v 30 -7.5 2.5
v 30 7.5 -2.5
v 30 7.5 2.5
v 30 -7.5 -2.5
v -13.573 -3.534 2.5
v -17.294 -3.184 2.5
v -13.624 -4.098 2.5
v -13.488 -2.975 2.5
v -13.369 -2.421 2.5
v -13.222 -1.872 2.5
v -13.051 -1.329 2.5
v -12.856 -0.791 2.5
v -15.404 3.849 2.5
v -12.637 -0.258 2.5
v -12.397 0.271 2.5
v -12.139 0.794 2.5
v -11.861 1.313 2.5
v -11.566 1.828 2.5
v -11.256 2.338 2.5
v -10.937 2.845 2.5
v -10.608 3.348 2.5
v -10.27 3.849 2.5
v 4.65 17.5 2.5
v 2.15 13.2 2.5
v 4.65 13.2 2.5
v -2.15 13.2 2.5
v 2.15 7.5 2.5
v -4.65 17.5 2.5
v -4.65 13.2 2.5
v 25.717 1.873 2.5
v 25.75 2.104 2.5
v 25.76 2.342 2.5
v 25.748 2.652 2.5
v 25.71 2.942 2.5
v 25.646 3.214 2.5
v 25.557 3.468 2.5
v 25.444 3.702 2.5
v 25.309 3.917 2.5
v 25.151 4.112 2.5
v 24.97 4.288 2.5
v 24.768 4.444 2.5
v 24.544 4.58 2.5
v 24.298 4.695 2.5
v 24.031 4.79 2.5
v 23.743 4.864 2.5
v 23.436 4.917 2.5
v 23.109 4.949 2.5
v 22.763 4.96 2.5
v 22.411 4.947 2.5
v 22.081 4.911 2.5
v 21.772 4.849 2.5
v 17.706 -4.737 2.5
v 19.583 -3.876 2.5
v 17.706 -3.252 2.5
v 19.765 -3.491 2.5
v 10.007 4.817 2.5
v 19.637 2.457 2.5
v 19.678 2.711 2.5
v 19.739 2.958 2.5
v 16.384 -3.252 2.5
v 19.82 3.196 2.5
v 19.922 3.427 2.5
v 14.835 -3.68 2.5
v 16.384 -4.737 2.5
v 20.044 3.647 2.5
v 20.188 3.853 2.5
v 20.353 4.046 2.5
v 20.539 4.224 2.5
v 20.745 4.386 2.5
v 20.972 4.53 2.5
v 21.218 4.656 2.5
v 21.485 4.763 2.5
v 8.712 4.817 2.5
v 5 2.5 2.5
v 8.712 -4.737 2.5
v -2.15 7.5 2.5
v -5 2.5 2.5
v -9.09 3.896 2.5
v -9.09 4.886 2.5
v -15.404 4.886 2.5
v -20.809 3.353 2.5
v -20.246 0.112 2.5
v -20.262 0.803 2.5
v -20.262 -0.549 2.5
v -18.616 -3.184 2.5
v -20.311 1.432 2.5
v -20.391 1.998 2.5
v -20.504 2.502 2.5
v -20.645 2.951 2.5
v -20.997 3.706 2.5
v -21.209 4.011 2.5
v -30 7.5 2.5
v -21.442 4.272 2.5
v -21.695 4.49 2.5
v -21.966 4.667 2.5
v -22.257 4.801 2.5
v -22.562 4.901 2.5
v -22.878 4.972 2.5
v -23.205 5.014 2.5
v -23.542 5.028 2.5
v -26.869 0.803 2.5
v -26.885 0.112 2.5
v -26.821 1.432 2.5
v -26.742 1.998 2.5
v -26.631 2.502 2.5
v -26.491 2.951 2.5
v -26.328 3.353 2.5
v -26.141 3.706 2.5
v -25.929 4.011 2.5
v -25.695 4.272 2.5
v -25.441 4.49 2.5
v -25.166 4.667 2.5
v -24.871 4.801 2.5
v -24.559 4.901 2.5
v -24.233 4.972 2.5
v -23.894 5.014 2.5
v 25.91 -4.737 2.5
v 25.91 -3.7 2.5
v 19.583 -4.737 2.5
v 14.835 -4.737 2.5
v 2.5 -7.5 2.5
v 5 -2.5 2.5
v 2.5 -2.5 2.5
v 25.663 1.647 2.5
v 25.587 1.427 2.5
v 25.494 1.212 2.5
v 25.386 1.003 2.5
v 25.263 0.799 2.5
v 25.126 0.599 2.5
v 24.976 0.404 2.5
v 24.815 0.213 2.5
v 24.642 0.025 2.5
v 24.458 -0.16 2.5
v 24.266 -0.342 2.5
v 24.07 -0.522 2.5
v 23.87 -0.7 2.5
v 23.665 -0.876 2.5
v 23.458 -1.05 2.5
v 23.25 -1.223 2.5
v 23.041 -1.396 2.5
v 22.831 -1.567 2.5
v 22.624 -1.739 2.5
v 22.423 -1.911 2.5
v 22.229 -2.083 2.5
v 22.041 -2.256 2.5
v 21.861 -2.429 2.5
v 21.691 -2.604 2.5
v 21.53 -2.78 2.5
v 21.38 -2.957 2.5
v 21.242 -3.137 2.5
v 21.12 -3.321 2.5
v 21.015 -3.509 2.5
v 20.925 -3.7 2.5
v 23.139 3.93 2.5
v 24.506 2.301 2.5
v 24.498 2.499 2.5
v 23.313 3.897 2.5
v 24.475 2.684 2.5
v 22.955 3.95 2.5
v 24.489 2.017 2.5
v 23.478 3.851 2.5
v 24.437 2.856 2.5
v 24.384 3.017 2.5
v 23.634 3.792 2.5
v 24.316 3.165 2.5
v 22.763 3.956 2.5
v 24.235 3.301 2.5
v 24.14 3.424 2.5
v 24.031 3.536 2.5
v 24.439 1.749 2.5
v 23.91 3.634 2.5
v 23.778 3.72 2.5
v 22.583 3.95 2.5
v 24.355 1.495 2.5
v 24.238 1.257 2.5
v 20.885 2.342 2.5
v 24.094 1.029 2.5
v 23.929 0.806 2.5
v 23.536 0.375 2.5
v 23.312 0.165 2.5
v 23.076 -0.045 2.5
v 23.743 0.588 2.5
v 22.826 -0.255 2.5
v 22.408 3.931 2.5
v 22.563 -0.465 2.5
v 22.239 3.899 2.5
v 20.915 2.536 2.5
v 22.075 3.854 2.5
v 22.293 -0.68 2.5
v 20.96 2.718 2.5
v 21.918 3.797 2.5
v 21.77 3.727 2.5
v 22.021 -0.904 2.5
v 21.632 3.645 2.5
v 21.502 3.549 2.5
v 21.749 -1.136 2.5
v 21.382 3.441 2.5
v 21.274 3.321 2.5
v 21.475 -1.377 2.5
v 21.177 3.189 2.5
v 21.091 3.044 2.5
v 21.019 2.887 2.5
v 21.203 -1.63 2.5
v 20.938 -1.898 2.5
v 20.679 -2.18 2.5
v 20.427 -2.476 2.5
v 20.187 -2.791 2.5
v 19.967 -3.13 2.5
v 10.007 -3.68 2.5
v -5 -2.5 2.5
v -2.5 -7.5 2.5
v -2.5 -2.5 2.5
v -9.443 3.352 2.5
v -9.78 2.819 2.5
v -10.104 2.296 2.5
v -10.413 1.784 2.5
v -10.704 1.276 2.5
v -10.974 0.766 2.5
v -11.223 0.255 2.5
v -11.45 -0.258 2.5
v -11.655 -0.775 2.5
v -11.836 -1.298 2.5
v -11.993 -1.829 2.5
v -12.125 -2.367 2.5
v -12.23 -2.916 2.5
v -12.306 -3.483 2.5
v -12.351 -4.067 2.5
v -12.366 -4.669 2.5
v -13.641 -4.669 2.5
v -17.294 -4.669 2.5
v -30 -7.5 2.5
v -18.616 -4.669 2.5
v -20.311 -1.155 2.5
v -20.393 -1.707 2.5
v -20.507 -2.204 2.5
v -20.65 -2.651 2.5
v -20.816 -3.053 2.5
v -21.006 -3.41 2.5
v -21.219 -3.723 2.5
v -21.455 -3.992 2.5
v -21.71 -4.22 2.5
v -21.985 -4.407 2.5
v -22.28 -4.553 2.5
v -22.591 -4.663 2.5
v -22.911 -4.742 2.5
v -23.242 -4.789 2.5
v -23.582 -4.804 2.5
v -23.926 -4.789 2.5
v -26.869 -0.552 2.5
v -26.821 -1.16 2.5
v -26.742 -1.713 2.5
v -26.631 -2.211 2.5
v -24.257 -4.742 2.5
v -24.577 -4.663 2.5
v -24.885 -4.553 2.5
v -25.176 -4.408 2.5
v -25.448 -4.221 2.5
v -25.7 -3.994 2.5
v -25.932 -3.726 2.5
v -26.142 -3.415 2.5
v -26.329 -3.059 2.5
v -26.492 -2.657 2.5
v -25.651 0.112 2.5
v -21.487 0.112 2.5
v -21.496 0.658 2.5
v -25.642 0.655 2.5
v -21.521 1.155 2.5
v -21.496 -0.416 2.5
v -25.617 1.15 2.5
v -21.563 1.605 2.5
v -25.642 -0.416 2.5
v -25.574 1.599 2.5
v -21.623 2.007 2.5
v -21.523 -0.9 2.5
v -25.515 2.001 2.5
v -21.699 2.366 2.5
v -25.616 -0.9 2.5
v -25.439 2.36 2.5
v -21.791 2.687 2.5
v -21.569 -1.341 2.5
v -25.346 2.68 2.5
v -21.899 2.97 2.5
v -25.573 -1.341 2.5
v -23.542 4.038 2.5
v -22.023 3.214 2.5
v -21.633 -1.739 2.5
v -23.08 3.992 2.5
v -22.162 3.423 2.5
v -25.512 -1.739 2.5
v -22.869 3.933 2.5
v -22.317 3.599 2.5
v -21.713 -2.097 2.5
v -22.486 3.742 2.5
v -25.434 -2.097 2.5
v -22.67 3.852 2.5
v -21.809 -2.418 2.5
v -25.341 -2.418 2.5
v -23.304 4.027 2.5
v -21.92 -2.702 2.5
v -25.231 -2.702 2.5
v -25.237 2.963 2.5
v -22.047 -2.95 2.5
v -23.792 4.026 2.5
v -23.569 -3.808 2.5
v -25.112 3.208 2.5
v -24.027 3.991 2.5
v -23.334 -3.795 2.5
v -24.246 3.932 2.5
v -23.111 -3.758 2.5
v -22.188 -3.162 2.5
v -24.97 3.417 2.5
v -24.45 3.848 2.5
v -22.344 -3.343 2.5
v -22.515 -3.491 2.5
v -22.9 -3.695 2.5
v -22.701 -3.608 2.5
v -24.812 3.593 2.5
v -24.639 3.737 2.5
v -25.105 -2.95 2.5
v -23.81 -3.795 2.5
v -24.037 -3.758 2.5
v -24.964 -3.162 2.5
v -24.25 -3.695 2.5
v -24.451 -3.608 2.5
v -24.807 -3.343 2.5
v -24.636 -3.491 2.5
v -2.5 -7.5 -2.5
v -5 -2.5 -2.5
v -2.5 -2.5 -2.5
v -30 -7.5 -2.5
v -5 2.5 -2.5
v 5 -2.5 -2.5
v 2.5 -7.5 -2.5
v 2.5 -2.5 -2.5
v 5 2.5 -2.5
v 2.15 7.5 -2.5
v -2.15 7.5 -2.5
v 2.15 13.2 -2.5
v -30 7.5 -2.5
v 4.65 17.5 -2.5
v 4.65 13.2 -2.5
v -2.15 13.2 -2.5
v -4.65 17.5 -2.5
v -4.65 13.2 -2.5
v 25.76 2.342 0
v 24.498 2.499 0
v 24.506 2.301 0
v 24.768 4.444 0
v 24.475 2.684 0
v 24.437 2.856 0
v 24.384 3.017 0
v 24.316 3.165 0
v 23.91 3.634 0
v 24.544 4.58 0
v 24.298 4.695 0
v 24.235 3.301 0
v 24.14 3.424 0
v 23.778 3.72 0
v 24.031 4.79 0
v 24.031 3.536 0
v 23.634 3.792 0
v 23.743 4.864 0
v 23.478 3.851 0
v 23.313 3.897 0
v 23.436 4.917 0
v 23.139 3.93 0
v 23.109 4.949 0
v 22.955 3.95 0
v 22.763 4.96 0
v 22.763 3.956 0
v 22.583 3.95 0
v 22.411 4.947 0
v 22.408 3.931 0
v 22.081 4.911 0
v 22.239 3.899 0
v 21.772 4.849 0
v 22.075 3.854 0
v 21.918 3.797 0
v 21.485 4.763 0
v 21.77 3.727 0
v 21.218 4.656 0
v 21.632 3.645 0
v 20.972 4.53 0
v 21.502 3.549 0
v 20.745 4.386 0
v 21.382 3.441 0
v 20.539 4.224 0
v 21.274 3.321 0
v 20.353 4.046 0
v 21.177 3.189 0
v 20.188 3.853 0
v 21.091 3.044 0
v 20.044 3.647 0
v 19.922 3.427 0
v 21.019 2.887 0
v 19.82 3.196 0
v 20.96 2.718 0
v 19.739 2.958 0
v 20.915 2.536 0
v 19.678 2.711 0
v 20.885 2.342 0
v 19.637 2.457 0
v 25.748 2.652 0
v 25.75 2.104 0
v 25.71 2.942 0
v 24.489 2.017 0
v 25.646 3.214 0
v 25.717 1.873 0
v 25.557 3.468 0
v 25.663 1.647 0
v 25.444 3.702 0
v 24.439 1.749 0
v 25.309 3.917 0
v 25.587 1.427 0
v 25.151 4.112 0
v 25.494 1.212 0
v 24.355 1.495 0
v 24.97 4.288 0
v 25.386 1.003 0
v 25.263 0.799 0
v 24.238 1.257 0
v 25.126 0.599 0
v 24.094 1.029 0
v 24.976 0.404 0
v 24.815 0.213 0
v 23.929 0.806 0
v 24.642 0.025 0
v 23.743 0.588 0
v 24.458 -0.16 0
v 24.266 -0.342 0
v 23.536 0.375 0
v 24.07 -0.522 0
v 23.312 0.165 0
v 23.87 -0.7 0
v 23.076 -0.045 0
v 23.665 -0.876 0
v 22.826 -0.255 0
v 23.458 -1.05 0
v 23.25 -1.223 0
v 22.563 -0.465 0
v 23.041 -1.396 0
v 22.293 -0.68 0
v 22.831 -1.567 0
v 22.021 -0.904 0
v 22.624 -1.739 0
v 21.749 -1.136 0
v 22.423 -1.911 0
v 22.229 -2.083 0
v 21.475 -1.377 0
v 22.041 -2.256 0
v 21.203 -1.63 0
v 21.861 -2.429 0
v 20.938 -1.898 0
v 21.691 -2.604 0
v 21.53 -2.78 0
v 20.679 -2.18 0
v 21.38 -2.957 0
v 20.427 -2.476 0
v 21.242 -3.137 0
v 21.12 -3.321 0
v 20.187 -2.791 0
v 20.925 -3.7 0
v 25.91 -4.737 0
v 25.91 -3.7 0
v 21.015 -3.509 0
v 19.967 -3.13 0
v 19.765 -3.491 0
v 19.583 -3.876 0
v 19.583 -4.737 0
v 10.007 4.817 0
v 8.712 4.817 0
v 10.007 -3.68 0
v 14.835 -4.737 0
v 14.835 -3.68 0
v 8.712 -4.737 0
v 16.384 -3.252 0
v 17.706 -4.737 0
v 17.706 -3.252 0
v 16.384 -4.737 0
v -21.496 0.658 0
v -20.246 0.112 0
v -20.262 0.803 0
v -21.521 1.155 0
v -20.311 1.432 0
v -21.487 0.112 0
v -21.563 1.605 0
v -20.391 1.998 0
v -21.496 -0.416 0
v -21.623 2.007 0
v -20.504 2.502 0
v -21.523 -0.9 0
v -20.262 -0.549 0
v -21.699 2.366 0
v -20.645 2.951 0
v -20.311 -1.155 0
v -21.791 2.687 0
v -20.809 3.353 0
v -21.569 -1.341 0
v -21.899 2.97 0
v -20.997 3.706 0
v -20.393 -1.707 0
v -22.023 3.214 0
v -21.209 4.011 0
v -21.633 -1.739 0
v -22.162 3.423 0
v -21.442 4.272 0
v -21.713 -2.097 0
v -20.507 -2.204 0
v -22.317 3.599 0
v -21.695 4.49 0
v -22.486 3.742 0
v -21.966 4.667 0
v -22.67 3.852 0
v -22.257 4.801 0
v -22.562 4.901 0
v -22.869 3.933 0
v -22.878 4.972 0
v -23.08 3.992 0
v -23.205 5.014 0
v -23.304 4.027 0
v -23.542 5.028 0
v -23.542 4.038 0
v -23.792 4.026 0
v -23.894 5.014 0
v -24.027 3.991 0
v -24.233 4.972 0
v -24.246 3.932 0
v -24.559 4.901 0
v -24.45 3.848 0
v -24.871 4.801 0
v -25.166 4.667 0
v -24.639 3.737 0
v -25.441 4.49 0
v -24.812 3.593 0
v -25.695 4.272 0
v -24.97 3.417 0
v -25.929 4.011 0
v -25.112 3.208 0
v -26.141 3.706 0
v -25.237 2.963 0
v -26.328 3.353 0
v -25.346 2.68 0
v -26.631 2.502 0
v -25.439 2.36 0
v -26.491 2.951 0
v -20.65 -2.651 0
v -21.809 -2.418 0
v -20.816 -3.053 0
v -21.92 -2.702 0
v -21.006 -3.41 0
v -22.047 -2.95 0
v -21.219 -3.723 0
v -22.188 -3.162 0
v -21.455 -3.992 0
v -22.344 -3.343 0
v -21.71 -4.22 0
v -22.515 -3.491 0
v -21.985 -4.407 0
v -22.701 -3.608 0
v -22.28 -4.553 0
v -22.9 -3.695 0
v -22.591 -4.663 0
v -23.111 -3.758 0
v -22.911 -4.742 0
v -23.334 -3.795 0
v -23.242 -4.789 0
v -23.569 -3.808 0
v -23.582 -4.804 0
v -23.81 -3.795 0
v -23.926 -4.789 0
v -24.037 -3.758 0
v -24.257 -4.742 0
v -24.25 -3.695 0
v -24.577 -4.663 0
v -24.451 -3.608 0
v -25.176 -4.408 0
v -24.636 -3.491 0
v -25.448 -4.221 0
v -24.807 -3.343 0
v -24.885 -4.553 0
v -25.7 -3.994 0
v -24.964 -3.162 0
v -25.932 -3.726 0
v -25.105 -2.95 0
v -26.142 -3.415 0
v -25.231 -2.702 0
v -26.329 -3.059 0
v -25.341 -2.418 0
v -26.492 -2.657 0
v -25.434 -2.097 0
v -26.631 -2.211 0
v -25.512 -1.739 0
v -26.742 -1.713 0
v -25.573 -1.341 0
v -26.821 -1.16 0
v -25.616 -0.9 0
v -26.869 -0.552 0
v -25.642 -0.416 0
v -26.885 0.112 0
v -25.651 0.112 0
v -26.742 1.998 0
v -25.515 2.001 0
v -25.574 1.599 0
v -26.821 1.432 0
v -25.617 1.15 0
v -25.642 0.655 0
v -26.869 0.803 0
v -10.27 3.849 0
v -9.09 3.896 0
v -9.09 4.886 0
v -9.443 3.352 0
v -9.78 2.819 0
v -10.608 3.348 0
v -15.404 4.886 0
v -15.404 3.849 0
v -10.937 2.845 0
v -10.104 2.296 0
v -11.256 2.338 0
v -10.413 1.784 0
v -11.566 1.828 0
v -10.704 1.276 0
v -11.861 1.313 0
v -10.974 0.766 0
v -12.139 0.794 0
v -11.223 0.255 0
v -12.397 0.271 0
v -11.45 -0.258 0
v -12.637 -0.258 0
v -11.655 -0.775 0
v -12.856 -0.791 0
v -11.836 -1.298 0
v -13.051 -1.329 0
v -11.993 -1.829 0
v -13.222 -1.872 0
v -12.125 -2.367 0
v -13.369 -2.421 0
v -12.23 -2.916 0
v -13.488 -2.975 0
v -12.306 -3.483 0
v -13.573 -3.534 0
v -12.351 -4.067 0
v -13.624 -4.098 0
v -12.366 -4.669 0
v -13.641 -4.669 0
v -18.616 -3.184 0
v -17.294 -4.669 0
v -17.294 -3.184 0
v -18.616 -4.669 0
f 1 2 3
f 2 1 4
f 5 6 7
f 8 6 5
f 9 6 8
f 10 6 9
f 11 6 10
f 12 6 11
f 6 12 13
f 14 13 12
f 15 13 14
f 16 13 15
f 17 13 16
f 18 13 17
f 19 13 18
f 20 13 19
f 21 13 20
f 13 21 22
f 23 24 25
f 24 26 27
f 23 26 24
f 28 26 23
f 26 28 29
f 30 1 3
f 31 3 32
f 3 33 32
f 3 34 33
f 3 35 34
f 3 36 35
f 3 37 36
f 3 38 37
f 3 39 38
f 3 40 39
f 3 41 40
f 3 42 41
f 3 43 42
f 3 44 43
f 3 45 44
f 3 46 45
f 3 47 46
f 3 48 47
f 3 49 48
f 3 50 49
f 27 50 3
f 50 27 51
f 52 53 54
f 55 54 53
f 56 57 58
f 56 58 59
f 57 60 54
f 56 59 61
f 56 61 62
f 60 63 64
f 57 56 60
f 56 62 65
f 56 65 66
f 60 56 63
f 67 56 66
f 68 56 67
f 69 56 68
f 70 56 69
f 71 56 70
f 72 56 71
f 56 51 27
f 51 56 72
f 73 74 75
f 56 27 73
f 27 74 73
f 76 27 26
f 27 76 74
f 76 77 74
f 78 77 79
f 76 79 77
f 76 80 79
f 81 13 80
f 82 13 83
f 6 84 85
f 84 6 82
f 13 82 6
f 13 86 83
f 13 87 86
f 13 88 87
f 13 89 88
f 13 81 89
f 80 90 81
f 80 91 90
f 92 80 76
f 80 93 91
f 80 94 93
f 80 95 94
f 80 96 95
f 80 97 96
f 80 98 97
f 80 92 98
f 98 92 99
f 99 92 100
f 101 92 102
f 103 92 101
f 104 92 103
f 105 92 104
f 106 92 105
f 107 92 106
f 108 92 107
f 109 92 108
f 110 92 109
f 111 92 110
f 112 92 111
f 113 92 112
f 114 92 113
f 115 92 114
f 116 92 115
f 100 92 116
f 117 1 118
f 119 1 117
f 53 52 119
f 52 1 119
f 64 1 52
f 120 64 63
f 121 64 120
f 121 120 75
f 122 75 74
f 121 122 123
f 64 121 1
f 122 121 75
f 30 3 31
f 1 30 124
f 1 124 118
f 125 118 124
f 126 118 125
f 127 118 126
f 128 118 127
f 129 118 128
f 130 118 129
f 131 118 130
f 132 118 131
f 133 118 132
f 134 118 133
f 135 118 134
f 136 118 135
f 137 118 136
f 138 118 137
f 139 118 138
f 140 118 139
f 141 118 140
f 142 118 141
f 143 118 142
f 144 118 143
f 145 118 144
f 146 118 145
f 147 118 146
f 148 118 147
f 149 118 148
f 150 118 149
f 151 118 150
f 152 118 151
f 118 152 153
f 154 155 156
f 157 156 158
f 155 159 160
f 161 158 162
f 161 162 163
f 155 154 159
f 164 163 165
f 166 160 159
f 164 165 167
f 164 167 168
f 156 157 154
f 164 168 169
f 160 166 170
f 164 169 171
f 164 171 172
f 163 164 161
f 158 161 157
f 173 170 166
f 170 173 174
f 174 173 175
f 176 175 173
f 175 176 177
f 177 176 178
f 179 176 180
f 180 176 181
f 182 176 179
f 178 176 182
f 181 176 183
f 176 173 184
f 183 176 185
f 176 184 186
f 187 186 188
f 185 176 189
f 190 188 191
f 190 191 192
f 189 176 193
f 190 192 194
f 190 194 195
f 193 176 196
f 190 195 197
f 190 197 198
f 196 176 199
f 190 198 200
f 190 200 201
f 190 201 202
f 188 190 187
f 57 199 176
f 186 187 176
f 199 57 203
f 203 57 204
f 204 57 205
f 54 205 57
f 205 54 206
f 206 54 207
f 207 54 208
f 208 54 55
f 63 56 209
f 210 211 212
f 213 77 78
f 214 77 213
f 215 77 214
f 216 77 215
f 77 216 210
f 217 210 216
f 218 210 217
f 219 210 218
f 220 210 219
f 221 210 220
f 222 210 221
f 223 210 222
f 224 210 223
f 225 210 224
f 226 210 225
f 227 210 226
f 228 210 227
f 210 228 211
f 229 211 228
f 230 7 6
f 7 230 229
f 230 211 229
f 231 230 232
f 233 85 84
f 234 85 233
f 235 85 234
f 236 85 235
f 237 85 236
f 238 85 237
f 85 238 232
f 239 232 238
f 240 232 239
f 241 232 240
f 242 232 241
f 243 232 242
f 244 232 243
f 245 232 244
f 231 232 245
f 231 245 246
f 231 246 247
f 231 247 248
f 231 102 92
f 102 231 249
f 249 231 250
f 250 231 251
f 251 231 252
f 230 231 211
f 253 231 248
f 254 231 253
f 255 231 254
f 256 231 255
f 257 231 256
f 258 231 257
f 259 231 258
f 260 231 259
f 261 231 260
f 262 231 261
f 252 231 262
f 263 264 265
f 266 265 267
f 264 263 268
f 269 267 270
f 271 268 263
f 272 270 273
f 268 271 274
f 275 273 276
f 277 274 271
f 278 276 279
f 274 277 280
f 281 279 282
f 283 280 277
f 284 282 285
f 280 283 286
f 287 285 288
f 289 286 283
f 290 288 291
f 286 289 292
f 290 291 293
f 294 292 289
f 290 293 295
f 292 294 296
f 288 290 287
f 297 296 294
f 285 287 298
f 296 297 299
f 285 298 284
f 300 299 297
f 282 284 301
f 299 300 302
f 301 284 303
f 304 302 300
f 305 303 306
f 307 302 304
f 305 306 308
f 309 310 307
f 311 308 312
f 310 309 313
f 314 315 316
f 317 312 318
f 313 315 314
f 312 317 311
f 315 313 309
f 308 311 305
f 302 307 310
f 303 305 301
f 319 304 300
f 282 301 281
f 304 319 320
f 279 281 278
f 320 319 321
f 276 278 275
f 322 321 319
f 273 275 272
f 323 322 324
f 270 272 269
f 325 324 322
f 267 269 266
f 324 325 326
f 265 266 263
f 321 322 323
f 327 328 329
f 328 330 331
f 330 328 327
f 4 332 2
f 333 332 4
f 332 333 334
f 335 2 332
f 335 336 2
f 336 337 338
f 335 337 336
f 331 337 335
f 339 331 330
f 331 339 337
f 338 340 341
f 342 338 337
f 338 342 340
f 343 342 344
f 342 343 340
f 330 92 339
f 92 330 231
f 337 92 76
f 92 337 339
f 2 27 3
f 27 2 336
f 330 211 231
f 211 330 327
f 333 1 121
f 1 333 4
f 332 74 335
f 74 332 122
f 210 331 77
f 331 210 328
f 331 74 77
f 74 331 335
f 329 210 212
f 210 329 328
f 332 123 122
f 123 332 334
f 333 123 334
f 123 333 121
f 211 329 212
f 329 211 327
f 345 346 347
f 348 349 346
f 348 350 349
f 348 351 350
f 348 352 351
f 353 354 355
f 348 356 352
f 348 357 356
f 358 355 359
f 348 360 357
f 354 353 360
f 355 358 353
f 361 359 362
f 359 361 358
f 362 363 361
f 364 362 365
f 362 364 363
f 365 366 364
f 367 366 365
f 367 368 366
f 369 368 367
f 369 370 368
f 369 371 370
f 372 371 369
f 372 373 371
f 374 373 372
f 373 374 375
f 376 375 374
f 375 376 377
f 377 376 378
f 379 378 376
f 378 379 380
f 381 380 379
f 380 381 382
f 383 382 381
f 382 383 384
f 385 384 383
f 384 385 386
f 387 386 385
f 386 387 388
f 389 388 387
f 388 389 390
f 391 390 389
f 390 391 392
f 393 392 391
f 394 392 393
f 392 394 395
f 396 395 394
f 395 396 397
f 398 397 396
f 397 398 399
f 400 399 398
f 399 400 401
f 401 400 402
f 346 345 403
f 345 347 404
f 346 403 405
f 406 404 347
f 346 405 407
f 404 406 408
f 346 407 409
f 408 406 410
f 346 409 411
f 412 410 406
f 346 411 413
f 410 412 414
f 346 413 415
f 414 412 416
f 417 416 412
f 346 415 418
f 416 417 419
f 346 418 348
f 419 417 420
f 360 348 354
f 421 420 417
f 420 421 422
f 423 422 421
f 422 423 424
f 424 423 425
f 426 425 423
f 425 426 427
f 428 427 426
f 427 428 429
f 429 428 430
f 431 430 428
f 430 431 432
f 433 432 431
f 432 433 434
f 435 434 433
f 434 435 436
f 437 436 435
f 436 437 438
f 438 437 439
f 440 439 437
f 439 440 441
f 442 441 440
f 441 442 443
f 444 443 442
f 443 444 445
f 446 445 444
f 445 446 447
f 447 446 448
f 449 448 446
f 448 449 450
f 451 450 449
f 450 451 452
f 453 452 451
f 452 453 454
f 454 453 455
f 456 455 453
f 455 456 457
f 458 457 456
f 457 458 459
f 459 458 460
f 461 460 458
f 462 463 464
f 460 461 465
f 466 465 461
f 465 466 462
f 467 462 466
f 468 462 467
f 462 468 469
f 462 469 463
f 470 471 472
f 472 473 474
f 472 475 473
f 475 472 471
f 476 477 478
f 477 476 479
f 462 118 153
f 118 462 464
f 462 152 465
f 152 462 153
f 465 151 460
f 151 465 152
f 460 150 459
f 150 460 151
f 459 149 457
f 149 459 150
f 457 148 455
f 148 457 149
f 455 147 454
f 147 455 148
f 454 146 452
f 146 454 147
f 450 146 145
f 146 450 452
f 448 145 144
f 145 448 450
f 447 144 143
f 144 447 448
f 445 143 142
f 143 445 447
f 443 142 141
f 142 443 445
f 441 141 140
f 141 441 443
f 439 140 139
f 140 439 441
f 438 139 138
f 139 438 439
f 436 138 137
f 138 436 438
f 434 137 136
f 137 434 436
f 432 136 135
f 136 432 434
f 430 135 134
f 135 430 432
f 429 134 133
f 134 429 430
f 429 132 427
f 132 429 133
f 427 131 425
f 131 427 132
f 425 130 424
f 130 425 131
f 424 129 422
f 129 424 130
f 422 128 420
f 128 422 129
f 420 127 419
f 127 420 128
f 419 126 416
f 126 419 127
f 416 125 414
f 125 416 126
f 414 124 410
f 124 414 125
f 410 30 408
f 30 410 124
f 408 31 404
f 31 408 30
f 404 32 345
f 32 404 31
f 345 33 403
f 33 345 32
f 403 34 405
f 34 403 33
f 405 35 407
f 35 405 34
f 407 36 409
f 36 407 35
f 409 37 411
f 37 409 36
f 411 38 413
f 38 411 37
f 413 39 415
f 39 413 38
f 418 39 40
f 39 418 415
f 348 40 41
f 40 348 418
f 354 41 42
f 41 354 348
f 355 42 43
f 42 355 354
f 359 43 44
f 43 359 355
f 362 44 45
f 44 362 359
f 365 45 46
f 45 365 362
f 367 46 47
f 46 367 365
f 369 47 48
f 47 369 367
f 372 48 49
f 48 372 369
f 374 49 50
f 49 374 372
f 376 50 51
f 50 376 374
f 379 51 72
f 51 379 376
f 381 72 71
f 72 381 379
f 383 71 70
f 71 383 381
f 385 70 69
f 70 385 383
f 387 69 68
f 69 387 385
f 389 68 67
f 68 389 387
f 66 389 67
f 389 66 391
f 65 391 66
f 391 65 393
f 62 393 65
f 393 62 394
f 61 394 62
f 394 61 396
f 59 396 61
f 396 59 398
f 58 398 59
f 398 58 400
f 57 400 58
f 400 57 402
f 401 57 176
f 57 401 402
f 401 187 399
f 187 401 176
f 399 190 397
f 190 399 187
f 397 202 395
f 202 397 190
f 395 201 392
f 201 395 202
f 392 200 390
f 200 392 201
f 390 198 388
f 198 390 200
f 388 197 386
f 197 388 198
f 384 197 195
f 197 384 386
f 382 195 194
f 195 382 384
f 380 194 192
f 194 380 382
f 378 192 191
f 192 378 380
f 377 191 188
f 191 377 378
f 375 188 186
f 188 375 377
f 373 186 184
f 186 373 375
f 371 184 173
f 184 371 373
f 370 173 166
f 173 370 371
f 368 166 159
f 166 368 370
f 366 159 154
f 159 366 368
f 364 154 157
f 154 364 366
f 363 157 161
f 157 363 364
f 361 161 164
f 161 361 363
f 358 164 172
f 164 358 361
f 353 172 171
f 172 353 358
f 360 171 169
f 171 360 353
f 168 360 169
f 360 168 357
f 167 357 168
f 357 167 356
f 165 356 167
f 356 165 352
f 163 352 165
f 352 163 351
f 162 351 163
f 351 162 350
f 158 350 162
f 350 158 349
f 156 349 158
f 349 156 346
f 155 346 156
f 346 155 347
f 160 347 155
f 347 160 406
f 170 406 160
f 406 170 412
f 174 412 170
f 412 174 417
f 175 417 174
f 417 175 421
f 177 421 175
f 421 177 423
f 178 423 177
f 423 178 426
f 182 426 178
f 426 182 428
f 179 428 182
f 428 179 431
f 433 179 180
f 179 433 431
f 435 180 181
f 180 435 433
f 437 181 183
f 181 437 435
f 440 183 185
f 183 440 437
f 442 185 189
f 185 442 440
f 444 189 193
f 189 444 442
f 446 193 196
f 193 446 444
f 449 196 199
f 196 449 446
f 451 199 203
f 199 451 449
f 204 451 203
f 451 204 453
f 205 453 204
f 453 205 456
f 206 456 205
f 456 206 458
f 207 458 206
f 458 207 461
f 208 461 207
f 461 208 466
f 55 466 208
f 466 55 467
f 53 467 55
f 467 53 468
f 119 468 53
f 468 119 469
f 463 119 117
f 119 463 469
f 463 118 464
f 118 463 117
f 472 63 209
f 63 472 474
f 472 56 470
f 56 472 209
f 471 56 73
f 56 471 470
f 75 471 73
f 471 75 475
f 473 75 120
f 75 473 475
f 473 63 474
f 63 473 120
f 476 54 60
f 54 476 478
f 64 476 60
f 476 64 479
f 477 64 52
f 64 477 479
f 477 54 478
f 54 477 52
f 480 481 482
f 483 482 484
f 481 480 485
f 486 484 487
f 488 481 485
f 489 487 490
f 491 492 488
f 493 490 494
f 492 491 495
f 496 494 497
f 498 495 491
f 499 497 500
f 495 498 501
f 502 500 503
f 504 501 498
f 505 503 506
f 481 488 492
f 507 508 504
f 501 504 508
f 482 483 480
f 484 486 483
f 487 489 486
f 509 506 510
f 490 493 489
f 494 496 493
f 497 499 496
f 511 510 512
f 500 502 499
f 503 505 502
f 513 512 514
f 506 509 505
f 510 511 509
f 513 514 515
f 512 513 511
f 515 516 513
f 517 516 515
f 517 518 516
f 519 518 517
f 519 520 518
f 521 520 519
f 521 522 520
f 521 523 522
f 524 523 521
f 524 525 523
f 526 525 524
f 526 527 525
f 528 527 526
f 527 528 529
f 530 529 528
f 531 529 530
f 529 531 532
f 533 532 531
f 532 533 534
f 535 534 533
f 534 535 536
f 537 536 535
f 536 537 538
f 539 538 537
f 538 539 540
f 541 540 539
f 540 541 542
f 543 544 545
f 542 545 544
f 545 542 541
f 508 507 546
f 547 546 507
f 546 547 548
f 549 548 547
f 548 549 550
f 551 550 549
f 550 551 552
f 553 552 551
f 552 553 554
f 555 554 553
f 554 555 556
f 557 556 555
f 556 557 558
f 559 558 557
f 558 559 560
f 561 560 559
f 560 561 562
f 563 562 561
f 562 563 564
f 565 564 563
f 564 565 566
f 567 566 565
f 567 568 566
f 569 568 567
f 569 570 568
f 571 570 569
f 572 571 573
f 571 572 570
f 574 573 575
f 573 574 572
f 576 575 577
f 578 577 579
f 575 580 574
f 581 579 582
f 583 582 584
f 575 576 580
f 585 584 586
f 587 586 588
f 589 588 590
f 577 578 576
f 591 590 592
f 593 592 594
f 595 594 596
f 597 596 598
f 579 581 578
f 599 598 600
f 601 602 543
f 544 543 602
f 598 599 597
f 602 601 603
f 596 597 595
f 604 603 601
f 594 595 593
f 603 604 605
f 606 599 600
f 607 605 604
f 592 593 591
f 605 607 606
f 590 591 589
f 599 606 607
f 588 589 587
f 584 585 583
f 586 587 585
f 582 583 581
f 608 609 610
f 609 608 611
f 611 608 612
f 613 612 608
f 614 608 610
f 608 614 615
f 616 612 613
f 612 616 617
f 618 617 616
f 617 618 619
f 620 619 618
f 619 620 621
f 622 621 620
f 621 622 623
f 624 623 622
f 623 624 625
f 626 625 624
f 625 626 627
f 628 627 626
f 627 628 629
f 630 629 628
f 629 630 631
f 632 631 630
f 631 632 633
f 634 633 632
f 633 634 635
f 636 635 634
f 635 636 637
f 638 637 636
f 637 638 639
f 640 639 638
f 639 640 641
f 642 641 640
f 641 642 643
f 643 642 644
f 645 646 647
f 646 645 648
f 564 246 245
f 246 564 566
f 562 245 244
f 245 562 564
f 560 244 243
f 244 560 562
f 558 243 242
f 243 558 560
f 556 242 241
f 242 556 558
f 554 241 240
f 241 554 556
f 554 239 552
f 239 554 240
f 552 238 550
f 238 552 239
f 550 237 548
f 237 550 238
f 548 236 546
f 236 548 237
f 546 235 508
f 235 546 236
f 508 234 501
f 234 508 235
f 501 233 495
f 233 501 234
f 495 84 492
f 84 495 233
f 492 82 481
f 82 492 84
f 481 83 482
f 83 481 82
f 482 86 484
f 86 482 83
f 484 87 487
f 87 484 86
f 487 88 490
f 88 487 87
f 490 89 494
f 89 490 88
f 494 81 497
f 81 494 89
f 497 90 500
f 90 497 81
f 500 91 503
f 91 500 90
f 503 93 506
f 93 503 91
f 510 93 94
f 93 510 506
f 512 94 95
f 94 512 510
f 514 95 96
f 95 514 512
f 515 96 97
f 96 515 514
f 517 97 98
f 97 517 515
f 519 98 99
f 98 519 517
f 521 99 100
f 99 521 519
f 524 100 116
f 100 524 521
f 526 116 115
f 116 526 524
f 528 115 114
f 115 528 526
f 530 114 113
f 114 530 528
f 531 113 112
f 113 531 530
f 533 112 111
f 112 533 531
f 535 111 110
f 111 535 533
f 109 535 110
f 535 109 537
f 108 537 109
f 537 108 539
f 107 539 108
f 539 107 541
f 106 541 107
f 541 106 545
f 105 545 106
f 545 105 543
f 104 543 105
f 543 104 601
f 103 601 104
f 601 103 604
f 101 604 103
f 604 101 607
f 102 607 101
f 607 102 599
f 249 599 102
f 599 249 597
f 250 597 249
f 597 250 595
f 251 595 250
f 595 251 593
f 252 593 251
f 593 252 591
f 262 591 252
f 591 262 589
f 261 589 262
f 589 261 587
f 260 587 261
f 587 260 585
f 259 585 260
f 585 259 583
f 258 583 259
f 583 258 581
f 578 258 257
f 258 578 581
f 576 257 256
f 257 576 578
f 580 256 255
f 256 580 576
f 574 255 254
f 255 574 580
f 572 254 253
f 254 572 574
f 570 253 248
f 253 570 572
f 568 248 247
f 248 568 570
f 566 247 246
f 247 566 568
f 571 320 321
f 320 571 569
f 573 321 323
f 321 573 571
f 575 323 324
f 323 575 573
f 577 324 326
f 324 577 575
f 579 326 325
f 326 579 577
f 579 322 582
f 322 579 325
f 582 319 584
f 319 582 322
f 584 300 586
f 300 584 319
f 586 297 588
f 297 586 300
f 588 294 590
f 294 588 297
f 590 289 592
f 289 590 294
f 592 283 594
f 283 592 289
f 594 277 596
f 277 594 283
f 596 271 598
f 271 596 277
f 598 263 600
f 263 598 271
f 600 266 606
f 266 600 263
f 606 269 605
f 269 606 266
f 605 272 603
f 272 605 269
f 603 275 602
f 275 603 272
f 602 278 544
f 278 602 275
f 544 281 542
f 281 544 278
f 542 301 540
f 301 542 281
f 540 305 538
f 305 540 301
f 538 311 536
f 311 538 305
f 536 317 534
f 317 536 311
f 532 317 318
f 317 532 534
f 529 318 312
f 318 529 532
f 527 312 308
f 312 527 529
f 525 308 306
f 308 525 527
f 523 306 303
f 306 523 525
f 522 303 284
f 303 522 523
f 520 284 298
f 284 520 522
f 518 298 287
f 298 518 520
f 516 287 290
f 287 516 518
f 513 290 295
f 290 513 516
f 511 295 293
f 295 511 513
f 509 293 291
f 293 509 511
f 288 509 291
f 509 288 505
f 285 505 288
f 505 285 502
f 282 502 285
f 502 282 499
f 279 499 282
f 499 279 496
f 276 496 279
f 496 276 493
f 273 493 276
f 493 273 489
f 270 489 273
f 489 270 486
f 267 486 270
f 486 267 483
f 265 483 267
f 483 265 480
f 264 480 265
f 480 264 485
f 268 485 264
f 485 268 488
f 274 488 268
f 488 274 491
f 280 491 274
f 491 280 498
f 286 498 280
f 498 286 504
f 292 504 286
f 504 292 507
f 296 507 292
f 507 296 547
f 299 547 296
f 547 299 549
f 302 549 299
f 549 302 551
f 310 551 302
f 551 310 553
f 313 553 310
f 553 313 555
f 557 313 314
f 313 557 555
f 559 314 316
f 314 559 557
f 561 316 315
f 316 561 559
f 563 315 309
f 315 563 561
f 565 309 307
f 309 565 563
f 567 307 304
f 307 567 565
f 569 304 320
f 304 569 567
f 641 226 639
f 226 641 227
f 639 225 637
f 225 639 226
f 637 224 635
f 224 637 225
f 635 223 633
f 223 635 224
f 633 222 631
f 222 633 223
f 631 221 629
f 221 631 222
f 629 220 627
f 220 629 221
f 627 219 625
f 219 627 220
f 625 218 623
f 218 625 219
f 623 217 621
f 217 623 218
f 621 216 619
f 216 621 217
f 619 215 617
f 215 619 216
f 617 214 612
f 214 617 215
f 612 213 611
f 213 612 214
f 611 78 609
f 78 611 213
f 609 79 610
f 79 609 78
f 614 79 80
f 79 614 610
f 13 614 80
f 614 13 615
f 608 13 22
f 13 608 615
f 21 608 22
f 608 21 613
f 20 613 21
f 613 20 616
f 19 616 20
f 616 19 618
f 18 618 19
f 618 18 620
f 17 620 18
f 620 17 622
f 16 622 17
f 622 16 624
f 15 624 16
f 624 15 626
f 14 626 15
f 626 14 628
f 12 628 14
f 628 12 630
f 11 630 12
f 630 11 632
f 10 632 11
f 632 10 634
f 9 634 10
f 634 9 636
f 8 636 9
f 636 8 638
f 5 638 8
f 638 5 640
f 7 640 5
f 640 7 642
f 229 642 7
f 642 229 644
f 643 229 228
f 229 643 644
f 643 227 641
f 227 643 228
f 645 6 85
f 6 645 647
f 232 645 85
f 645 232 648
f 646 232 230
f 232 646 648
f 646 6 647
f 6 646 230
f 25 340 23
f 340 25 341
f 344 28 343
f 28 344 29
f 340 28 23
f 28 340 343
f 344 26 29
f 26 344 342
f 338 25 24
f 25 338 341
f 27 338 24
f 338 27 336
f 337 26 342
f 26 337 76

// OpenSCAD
s_diff = 0.7;

difference(){
    cube([60,15,5], center=true);
    
    // The Hole
    translate([0,0,0])
        cube([10,5,6], center=true);
    translate([0,-5,0])
        cube([5,10,6], center=true);
    
    
    linear_extrude(3){
        translate([17,0])
            text(text="L.2", size=10, halign="center", valign = "center");
        }
    linear_extrude(3){
        translate([-18,0])
            text(text=str(s_diff), size=10, halign="center", valign = "center");
        }
    }
    
    // The Pin
    translate([0,15 + s_diff/2,0])
        cube([10 - s_diff, 5 - s_diff,5], center=true);
    translate([0,10,0])
        cube([5 - s_diff,10,5], center=true);
